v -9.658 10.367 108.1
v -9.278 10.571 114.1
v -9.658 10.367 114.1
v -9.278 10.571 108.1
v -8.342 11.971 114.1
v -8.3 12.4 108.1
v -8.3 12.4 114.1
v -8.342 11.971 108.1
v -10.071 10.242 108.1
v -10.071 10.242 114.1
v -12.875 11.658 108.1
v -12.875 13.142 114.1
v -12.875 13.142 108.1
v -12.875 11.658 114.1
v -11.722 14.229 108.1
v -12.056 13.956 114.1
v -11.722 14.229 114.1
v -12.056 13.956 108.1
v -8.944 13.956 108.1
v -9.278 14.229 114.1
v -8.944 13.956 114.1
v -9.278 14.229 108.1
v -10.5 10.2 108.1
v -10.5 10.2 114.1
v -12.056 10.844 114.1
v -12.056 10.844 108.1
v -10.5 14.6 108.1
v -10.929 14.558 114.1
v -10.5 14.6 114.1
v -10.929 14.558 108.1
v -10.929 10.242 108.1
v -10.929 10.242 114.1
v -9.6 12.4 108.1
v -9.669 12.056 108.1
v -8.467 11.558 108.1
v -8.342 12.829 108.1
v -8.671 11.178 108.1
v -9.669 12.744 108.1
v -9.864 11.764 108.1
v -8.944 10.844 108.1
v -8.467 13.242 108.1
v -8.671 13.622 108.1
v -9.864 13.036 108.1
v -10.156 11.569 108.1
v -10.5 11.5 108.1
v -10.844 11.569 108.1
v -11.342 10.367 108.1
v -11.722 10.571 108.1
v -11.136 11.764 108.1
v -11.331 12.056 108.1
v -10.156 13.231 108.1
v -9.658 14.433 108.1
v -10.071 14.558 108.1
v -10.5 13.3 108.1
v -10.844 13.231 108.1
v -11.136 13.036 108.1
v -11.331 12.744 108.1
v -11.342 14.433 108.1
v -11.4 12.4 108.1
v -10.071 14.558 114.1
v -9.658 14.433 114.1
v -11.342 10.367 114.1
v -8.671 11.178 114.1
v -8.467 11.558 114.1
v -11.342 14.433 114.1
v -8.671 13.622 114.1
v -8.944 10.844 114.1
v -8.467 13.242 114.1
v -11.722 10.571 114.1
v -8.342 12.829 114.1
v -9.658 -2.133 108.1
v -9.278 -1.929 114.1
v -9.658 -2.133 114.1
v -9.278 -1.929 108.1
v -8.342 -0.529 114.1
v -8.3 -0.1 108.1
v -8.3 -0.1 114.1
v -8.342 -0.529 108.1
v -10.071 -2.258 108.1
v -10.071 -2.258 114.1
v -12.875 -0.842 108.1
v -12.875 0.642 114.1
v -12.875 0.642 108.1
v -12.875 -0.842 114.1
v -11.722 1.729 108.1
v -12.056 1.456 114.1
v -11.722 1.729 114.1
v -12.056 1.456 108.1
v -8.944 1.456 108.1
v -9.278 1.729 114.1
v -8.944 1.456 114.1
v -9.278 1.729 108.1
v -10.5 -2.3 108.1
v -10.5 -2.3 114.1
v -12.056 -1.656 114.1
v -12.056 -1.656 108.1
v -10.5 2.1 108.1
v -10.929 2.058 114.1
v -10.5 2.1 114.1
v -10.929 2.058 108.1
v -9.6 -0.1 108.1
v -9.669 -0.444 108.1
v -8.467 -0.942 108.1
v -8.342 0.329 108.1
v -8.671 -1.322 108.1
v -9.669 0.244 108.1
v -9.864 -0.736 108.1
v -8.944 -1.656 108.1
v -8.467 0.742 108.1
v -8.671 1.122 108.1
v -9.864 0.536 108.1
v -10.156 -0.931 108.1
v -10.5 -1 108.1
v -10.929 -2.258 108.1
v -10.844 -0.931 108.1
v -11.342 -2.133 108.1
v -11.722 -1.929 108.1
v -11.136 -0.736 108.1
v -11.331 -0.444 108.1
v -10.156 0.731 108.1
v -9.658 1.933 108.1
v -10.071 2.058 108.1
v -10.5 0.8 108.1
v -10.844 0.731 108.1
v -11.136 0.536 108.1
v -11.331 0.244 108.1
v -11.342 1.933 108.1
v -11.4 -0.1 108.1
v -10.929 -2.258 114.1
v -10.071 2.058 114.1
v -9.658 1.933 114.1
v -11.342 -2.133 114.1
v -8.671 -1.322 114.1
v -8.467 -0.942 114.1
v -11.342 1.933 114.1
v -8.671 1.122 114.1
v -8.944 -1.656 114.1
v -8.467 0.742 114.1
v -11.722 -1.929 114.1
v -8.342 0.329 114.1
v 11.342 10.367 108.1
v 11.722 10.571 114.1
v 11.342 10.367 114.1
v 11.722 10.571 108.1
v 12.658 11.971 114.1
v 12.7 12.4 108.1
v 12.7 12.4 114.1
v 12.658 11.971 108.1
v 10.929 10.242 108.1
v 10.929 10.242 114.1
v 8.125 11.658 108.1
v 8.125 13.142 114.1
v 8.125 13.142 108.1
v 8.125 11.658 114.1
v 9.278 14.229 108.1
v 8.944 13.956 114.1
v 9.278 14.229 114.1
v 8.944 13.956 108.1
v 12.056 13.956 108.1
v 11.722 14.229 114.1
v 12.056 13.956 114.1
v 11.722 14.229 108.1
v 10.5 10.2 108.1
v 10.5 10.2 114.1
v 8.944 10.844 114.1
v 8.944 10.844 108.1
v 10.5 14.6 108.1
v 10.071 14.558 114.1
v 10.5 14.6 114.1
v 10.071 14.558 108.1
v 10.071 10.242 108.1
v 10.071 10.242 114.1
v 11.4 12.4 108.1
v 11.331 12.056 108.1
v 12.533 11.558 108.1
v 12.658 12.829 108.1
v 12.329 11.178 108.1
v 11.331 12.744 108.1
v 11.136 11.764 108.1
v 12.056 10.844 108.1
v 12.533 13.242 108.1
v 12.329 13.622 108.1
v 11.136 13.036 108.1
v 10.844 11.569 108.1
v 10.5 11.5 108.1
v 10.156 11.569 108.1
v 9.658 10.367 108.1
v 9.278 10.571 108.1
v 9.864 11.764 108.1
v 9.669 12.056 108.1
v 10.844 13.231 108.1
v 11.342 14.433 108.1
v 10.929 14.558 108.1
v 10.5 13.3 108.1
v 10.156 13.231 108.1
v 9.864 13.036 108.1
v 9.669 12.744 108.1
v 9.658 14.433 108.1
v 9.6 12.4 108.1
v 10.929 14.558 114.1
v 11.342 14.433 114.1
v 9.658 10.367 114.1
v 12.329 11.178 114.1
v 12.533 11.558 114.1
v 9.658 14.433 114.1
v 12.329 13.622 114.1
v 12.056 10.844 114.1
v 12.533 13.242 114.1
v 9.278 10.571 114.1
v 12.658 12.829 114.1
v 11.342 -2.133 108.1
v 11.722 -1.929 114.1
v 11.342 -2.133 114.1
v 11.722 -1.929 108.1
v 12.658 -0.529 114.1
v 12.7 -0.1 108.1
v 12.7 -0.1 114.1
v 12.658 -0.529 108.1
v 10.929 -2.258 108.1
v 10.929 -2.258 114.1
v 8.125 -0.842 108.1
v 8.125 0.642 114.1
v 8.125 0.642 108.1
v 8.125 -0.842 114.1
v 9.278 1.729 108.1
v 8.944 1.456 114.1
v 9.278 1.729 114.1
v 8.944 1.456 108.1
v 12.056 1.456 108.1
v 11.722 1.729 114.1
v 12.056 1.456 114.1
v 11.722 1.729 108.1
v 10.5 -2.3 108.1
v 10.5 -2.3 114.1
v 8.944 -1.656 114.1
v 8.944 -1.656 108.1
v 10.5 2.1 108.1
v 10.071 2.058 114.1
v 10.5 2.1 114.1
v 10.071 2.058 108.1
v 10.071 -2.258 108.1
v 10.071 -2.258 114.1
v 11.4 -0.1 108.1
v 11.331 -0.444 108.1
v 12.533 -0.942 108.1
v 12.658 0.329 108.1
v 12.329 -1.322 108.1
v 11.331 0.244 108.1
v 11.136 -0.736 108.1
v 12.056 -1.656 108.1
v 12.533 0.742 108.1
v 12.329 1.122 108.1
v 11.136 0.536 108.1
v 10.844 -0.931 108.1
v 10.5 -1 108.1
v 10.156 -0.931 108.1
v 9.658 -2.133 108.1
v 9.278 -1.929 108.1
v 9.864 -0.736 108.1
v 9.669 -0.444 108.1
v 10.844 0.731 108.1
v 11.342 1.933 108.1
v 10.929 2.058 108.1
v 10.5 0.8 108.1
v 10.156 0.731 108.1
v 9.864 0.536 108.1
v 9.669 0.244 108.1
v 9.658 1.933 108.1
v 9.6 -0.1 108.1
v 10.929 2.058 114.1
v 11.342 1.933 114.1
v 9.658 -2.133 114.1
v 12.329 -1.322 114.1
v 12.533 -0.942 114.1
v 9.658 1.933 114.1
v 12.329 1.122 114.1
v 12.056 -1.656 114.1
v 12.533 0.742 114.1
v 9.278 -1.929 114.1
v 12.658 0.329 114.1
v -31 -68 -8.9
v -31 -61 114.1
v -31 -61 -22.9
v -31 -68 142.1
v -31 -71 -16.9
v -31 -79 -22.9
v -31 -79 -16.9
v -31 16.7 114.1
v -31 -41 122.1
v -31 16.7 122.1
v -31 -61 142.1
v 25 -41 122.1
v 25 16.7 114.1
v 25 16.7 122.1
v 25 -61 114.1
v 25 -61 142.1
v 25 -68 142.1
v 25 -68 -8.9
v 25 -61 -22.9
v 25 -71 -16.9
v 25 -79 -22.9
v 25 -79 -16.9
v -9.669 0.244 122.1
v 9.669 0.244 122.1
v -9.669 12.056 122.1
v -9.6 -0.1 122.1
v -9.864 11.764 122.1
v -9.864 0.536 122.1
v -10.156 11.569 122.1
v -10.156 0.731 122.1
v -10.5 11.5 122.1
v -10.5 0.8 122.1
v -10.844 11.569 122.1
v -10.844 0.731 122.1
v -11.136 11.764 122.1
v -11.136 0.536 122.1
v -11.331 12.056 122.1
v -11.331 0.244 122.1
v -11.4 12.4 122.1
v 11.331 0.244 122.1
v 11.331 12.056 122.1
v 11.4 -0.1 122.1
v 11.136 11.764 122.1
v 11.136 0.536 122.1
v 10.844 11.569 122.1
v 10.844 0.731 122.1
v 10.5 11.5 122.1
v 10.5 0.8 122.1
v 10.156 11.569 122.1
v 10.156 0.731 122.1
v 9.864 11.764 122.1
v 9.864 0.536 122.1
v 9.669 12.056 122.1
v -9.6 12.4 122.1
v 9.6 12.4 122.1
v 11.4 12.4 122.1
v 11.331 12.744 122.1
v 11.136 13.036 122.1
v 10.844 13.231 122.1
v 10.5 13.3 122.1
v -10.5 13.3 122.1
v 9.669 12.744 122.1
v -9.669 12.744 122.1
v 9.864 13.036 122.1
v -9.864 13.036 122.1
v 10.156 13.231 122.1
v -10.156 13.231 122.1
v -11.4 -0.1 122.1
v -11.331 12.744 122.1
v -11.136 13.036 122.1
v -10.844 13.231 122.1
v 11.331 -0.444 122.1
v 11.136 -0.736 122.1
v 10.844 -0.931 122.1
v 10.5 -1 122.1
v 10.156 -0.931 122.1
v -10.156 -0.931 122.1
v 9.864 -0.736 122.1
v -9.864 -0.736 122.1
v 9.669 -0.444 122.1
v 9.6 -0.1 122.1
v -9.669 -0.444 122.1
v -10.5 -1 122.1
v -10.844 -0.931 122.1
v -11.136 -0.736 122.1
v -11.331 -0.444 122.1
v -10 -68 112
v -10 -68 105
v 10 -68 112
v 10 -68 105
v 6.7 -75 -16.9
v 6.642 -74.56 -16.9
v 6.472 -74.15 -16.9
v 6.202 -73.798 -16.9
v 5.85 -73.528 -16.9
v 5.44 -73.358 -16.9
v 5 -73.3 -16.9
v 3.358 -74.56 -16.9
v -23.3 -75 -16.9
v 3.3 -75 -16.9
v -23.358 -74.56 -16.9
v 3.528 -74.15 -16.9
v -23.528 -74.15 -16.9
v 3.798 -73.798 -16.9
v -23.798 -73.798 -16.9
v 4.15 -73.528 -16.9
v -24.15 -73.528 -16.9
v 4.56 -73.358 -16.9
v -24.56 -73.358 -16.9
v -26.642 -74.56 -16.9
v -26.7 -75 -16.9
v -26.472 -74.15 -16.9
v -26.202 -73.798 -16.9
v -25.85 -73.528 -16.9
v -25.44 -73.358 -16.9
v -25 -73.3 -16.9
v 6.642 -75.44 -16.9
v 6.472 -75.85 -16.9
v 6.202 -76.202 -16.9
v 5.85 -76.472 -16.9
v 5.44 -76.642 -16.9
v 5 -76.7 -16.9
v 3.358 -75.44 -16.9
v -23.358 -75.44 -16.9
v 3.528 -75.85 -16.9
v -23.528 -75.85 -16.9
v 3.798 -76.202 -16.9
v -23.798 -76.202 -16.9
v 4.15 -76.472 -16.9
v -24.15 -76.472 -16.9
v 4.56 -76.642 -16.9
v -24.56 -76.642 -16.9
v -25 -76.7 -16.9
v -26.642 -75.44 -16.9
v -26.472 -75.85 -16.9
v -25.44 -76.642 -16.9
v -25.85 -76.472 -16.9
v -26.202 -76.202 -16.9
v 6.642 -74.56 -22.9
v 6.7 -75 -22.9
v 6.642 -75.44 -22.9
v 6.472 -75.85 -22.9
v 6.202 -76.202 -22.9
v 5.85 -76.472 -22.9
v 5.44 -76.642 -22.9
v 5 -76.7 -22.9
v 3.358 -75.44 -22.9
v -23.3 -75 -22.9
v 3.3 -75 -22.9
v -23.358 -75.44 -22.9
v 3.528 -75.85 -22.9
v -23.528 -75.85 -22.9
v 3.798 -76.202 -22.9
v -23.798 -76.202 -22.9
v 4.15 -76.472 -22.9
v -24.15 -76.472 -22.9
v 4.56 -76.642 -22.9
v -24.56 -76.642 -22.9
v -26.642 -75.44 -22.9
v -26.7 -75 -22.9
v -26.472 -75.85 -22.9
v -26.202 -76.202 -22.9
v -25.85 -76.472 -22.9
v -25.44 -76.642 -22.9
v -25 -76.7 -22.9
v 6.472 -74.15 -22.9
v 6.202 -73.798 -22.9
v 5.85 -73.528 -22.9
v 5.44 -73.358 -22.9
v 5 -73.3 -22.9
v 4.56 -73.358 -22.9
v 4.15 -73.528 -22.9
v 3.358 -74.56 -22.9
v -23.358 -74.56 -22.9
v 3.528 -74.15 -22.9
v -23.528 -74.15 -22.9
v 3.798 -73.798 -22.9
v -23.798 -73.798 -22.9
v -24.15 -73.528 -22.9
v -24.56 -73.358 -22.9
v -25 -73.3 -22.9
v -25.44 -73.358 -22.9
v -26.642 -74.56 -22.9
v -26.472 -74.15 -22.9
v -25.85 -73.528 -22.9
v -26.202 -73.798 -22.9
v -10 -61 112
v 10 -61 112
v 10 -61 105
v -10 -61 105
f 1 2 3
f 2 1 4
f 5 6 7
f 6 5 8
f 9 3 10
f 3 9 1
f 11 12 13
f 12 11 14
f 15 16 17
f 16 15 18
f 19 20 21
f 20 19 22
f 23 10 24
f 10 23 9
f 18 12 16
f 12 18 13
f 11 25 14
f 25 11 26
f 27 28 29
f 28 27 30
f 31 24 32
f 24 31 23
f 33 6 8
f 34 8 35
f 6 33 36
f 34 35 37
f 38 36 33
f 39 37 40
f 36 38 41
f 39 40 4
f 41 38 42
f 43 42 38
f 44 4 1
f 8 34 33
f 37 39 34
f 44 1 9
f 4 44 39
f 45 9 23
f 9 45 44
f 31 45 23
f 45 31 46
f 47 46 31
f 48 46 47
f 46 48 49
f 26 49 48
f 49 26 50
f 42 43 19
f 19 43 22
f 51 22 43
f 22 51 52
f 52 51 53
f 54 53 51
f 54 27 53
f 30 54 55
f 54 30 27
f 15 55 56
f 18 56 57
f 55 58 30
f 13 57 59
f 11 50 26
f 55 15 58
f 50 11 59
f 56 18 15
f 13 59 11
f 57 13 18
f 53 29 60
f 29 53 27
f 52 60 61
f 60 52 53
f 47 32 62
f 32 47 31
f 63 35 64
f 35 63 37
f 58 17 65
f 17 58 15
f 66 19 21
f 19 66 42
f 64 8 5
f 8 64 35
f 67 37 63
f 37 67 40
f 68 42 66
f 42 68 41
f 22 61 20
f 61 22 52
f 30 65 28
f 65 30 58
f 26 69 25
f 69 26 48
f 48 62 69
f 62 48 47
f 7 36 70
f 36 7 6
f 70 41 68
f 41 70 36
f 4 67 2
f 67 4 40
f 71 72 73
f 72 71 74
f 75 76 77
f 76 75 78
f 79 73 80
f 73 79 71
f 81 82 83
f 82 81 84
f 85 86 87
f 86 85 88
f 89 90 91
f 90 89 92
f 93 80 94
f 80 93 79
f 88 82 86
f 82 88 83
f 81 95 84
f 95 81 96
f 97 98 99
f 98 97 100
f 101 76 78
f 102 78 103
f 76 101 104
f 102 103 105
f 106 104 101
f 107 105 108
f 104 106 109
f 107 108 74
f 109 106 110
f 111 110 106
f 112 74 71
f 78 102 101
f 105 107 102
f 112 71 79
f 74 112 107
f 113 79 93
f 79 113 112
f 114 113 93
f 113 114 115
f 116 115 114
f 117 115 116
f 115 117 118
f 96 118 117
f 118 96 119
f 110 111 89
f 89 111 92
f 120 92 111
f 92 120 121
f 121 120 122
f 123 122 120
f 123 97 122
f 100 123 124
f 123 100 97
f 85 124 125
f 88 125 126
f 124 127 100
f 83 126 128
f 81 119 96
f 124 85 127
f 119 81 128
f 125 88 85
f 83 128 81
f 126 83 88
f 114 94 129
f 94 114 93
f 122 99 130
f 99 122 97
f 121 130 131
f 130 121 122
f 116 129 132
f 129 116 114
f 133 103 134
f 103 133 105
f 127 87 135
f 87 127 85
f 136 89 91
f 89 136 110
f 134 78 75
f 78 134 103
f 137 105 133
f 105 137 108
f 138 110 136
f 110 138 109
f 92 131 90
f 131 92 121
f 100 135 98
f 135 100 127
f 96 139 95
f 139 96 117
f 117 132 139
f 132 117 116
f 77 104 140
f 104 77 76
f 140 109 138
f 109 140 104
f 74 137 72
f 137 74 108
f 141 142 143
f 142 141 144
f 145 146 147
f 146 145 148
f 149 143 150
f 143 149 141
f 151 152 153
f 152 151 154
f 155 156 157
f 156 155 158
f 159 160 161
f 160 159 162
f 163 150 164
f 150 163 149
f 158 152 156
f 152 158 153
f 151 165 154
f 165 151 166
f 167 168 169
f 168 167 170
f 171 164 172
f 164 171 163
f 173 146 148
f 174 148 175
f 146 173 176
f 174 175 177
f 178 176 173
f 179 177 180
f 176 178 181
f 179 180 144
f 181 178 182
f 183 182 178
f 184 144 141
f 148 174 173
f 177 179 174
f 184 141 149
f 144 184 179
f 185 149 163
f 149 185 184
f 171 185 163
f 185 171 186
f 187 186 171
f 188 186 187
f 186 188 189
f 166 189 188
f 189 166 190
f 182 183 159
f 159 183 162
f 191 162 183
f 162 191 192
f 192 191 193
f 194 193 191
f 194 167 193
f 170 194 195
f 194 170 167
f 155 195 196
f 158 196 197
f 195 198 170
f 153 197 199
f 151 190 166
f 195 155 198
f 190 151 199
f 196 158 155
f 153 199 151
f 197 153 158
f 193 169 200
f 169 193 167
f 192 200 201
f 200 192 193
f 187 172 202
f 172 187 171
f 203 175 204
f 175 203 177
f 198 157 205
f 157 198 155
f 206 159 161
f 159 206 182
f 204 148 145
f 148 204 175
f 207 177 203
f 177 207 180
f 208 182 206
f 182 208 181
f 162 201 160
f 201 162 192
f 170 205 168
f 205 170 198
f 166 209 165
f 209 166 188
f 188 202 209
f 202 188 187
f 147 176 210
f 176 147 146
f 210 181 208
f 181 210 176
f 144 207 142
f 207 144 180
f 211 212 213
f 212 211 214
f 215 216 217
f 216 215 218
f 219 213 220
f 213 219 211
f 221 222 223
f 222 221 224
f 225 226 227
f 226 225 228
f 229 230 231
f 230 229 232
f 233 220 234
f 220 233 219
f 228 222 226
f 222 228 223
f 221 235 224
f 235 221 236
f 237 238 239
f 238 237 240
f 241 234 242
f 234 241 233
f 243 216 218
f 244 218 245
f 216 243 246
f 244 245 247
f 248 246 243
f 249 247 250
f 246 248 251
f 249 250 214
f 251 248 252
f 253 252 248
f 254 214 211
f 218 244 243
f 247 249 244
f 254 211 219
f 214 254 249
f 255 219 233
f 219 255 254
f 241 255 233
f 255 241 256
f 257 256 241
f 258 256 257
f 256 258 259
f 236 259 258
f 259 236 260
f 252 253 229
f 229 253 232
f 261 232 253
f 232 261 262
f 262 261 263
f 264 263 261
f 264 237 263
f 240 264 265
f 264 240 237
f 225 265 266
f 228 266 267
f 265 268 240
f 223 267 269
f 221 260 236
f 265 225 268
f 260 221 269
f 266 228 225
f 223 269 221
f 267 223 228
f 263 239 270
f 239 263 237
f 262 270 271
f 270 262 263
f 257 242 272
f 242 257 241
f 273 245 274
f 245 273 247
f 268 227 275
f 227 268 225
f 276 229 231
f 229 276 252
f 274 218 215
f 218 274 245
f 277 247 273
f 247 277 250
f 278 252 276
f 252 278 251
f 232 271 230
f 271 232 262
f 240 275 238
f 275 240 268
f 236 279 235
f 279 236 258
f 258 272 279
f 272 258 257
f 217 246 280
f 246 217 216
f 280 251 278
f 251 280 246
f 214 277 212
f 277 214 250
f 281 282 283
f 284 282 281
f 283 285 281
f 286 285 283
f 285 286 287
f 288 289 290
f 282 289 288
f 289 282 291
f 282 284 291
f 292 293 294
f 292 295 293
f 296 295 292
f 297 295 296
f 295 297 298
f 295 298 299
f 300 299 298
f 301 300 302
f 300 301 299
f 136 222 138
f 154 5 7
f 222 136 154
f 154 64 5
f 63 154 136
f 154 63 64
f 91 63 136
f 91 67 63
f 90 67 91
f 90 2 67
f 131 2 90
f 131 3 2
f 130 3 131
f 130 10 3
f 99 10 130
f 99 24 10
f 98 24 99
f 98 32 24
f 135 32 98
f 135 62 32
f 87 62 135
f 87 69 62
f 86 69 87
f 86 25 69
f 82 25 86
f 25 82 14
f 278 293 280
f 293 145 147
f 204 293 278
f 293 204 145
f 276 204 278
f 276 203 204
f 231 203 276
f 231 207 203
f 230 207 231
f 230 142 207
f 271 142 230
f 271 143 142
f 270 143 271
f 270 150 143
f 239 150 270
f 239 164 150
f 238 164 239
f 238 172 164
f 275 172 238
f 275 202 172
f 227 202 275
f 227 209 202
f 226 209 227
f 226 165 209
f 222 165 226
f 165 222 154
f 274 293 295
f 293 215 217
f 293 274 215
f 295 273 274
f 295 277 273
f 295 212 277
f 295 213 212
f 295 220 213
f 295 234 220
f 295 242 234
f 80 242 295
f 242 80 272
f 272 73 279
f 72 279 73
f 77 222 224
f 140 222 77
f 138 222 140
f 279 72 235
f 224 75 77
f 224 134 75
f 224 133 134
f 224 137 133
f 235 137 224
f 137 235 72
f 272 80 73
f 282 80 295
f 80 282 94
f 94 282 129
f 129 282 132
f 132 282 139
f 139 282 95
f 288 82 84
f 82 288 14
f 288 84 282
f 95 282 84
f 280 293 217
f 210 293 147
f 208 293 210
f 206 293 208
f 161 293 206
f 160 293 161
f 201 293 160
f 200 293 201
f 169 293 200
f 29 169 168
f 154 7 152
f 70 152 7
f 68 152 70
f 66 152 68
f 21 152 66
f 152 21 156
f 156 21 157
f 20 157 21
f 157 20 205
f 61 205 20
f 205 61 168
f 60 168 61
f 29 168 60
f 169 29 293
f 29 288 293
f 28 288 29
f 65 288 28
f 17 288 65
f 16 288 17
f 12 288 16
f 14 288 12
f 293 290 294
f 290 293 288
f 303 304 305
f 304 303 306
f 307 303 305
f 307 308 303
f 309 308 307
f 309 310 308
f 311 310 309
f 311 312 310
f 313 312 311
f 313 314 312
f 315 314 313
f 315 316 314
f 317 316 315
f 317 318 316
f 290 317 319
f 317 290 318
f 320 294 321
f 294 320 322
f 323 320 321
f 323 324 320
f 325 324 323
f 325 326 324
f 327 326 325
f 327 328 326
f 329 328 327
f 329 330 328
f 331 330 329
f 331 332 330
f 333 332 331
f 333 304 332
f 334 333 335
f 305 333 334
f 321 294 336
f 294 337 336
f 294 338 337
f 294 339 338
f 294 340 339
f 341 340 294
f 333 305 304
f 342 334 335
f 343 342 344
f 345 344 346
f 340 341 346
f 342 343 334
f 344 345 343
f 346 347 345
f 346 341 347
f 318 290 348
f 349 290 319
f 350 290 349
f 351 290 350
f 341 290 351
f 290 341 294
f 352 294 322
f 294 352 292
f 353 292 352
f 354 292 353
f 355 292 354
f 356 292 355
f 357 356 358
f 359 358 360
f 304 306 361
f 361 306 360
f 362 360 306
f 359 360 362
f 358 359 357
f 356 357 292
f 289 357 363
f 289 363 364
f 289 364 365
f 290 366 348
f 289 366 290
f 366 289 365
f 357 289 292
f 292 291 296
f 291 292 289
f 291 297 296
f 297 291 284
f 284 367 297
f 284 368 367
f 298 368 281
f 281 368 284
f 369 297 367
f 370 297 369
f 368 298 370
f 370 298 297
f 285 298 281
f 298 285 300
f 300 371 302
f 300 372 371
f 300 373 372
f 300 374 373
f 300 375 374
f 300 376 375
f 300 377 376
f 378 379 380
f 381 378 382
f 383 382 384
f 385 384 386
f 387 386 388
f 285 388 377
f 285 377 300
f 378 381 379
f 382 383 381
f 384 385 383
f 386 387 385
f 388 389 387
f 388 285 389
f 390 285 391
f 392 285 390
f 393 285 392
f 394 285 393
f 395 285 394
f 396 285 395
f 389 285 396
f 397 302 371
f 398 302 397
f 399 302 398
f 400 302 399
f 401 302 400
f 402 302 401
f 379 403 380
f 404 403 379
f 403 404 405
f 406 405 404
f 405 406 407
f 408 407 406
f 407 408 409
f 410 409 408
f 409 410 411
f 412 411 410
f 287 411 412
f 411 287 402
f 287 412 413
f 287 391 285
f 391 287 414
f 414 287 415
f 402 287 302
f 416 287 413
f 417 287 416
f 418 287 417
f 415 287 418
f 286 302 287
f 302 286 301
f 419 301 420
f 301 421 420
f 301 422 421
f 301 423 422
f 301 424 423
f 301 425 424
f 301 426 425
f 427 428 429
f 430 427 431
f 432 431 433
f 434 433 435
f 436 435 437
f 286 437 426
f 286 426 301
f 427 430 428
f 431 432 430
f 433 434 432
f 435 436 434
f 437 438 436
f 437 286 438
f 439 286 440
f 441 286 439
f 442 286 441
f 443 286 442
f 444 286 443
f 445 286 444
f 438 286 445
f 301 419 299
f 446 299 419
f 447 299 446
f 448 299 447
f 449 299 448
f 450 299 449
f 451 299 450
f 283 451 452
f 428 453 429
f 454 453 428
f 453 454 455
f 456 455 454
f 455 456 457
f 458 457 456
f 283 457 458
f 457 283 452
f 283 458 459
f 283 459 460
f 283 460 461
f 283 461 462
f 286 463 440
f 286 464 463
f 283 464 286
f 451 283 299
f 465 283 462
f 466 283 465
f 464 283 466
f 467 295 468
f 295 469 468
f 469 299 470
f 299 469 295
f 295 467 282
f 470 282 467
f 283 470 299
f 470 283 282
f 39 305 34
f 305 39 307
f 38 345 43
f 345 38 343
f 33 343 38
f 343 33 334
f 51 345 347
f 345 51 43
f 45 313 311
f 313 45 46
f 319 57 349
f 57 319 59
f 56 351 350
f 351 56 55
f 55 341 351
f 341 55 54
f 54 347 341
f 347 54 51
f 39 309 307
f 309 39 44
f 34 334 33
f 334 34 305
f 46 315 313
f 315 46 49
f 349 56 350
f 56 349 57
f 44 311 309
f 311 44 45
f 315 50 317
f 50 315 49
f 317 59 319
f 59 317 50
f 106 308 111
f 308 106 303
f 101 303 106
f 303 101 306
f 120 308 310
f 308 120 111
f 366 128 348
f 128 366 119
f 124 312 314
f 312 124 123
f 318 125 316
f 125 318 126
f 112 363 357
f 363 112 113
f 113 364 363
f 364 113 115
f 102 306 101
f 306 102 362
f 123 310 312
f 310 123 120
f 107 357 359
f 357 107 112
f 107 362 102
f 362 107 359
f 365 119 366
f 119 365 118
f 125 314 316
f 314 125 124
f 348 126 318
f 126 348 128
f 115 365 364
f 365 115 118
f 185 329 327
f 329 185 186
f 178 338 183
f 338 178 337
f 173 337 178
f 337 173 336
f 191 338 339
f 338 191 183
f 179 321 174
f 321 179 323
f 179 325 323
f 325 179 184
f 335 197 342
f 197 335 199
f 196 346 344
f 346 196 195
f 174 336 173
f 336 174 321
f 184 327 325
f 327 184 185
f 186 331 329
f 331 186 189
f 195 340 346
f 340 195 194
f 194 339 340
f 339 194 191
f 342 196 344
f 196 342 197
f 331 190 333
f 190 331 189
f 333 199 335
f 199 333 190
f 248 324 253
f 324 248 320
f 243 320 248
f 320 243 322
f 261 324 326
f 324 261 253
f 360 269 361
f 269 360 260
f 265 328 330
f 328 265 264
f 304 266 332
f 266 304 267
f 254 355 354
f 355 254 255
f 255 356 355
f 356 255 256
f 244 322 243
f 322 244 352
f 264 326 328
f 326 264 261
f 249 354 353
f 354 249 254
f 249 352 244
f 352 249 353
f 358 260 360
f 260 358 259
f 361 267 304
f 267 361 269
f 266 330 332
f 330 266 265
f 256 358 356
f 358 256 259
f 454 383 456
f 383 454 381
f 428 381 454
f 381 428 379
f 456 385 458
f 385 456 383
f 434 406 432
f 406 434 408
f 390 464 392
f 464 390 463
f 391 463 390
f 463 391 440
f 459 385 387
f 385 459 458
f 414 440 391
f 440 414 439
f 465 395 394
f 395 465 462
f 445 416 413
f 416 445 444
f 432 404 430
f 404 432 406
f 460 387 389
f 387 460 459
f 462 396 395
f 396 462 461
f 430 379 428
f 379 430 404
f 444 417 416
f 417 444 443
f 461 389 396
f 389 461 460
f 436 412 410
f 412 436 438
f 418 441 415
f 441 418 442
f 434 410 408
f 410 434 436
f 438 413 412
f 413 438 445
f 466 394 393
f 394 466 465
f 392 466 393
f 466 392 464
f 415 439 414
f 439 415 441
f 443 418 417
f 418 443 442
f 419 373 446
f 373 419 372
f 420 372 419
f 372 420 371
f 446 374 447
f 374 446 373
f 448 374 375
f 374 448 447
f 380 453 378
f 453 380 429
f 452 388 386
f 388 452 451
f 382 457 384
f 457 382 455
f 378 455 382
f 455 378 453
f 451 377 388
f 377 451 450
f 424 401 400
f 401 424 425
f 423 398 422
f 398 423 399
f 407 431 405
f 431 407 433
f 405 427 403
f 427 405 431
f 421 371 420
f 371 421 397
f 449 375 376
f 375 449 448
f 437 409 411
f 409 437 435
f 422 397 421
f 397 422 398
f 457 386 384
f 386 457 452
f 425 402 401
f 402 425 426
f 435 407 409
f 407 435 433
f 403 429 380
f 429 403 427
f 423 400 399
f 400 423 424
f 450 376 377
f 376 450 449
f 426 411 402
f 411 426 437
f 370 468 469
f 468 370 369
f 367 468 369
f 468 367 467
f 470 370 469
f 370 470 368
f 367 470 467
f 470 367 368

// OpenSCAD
// file: machine_frame.scad
// =============================================
// Riftbound Card Sorter — shared machine frame
// =============================================
// Single source of truth for the card path after the Nov 11 redesign
// (suction pick from a motor-raised hopper, raised transport line,
// cradle shuttle sorter). Machine coords as in assembly.scad:
//   X = card travel (hopper -> belt -> tray), Y = across belt (+Y = back,
//   electronics side), Z = up, Z=0 bottom of baseplate tiles.
// `use <machine_frame.scad>` does not import variables, so read these via
// the functions at the bottom.
// =============================================

base_top   = 4;      // top of baseplate tiles
riser_h    = 60;     // conveyor deck raised so cards can FALL into both tray floors
deck_z     = base_top + riser_h;          // rail base / hopper deck reference = 64

// Conveyor (geometry unchanged, just lifted by riser_h)
belt_x0    = -165;   // belt start
belt_x1    = 85;     // belt end
roller_x   = [-140, 60];
rail_in    = 45;     // |Y| of rail inner faces
shaft_z    = deck_z + 15;
card_z     = deck_z + 15 + 11.9;          // top of round belts = card face = 90.9
scan_flat  = [-127, 47];                  // slide-bed backed flat zone (X)

// Scanner
cam_x      = 5;      // lens axis; card centred here for capture (moved from -40 so the hood clears the arm drop zone at X -139..-51)

// Hopper (motor-raised floor keeps top card at card_z)
hopper_x   = -215;   // cavity centre X (Y = 0)

// Baseplate extents (3x3 tiles of 190x180)
base_x     = [-285, 285];
base_y     = [-270, 270];

// Pick & place hand-off
drop_x     = -95;    // card CENTRE when the suction arm releases it onto the belt
                     // (card spans -139..-51: on belts, clear of hopper wall)
drop_clear = 3;      // card underside this far above belt at release (low drop)

// Sorting tray (bottom on baseplate); owner of tray placement may move it in X
tray_floor_lower_z = base_top + 2.5;      // lower slot floor
tray_floor_upper_z = base_top + 65 + 3 + 2.5;  // = 74.5 upper slot floor

// Card
card_w = 63; card_l = 88; card_t = 0.33;  // RAW cards (owner confirmed 2026-11-11: no sleeves), ~1.75 g

// MG996R mounting-tab holes (all three servos: pick arm ch0, shuttle ch1 / ch2).
// ONE value for every mount: hole-centre pitch along the case (49.5, TowerPro
// MG996R drawing) × across it (10), symmetric about the case centre. Clones
// vary (48.5..50 seen); the servo's own tab holes are Ø4.5+ grommet holes, so
// an M3 / M2.5 still lands for ±0.7 mm. MEASURE YOUR SERVO; if it is further
// off, change it here and re-export the arm head and the shuttle end post / riser.
mg996r_hole_pitch = 49.5;
mg996r_hole_dx    = 10;

function frame_base_top()  = base_top;
function frame_riser_h()   = riser_h;
function frame_deck_z()    = deck_z;
function frame_belt_x0()   = belt_x0;
function frame_belt_x1()   = belt_x1;
function frame_roller_x()  = roller_x;
function frame_rail_in()   = rail_in;
function frame_card_z()    = card_z;
function frame_scan_flat() = scan_flat;
function frame_cam_x()     = cam_x;
function frame_hopper_x()  = hopper_x;
function frame_base_x()    = base_x;
function frame_base_y()    = base_y;
function frame_drop_x()    = drop_x;
function frame_drop_clear()= drop_clear;
function frame_tray_floor_lower_z() = tray_floor_lower_z;
function frame_tray_floor_upper_z() = tray_floor_upper_z;
function frame_mg996r_hole_pitch() = mg996r_hole_pitch;
function frame_mg996r_hole_dx()    = mg996r_hole_dx;
// main file
// =============================================
// Riftbound Card Sorter — Camera Bracket
// =============================================
// Hangs a Pi Camera Module 3 (standard, 66°×41° FOV) LENS-DOWN under a
// cantilever arm, 100 mm above the card face, its lens poking into the
// scanner hood's roof port. The bracket stands on the two FRONT (-Y) rail
// L-feet nearest the camera axis and shares their M3 screws.
//
// Shape (side profile in Y/Z, extruded along X):
//
//                gusset /|
//          arm =======/ |             ← PCB hangs under the arm tip on
//              [PCB]   |=|  ← CSI      4 standoffs, lens down
//               \lens/ | |    ribbon
//          ┌─hood roof─┐| |    slot     vertical plate, outside the front
//          │           │| |              (-Y) rail and its foot gussets
//   ===rail top===     │|_|\__
//                      ─────┘  ← foot on the 2 front rail L-feet (M3 shared)
//
// Material: PLA or PETG, 0.2 mm layers, 4 walls, 30–40 % infill
// =============================================
//
// COORDINATE FRAME (machine axes, as assembly.scad / machine_frame.scad):
//   X = card travel, Y = across belt (+Y = back / electronics side), Z = up.
//   ORIGIN = camera optical axis on the card face, i.e. machine
//   (frame_cam_x(), 0, frame_card_z()) = (5, 0, 90.9).
//   camera_bracket_placed() applies that translation.
//
// ---------------------------------------------
// CARD FACE / MOUNT HEIGHTS (machine Z, from machine_frame.scad)
//   baseplate top 4 → riser 60 → rail base (deck_z)          = 64
//   rail L-foot plate 4 mm thick → foot top                    = 68  ← bracket foot underside
//   roller axis deck_z + 15 = 79, belt top + 11.9 → card face  = 90.9
//   → foot underside local z = 68 − 90.9 = −22.9
//
// LENS HEIGHT (local z above the card face)
//   lens tip              z = lens_h                 = 100.00  (Pi Cam 3 min focus ~10 cm)
//   PCB front (lens side) z = lens_h + lens_proj     = 106.98  (RPi drawing: lens tip
//                                                       6.98 mm proud of the PCB)
//   PCB back              z = + pcb_t (1.12)         = 108.10
//   arm underside         z = + so_h (6)             = 114.10  (FPC connector 3.2 mm tall
//                                                       on the PCB back → 2.8 mm clear)
//   arm top               z = + arm_h (8)            = 122.10  (machine 213.0)
//   plate: foot underside → gusset top = 22.9 + 122.1 + 20 = 165 mm
//
// FIELD OF VIEW at 100 mm (Pi Cam 3 standard: 66° H × 41° V, apex at the lens tip)
//   along X: 2·100·tan(33°)   = 129.9 mm  vs card 88 → ±20.9 mm margin
//   along Y: 2·100·tan(20.5°) =  74.8 mm  vs card 63 → ±5.9 mm centred,
//            4.2 mm worst case with the card against a guide (±1.7 mm play).
//   (lens_h = 102 would give ≥ 5.0 mm worst case; kept at 100 per spec.)
//
// CARD ORIENTATION → PCB ORIENTATION
//   Cards travel along X with the 88 mm length along X, so the image's long
//   (66°) axis must lie along X. Per the RPi drawing the 66° axis is parallel
//   to the 25 mm PCB edge (FPC-connector edge, 21 mm hole spacing); the 41°
//   axis runs along the 23.862 mm PCB height (12.5 mm hole spacing).
//   ⇒ 21 mm hole spacing along X, 12.5 mm along Y, FPC edge facing −Y
//     (toward the plate and its ribbon slot). NOTE: this is the old bracket
//     turned 180° about Z, so set the camera transform to rotate 180°
//     (Picamera2: Transform(hflip=1, vflip=1)) if image orientation matters.
//
// PI CAMERA MODULE 3 (standard) — RPi mechanical drawing RP-008153-DS-1:
//   PCB 25 × 23.862 × 1.12 mm, 4× ø2.2 holes (ø4.75 pad keep-out).
//   Holes 2.0 mm from left/right edges → 21.0 mm apart.
//   Hole row A 2.0 mm from the edge AWAY from the FPC connector,
//   row B 14.5 mm from that edge → 12.5 mm apart (9.362 mm from FPC edge).
//   Lens centred left/right, 14.4 mm from the non-FPC edge.
//   FPC connector on the PCB back along the FPC edge: 19.61 × 5.71, ~3.2 tall.
//
//   PCB (u along the 25 mm edge, v from the non-FPC edge) → local:
//     X = u − 12.5,  Y = −(v − 14.4)   (lens at X = Y = 0, FPC edge at −Y)
//     holes  (−10.5, +12.4) (+10.5, +12.4)   row A, non-FPC side (+Y)
//            (−10.5,  −0.1) (+10.5,  −0.1)   row B, FPC side
//     PCB outline X −12.5..+12.5, Y −9.462..+14.4
// ---------------------------------------------

use <machine_frame.scad>
use <conveyor_rail.scad>

/* [Export] */
print_orient = false;  // true → lay on the −X face for slicing

// --- Frame ---
cam_x       = frame_cam_x();           // 5
card_z      = frame_card_z();          // 90.9
deck_z      = frame_deck_z();          // 64
rail_in     = frame_rail_in();         // 45
belt_x0     = frame_belt_x0();         // −165
rail_foot_t = 4;                       // conveyor_rail.scad foot_t
rail_wall   = rail_wall();             // 3
rail_gus    = 12;                      // conveyor_rail.scad foot_gusset (legs, mm)

// --- Optics / placement ---
lens_h      = 100;     // lens tip above card face
lens_proj   = 6.98;    // lens tip in front of PCB front face (RPi drawing)
pcb_t       = 1.12;    // PCB thickness

// --- Pi Cam 3 hole pattern (local XY, lens at origin) ---
cam_u       = [2.0, 23.0];               // hole u (along 25 mm edge)
cam_v       = [2.0, 14.5];               // hole v (from non-FPC edge)
lens_u      = 12.5;
lens_v      = 14.4;
pcb_w       = 25;
pcb_hgt     = 23.862;
m2_pilot    = 1.8;     // M2 self-tapping pilot (or tap M2)
so_od       = 4.4;     // standoff OD (fits inside ø4.75 pad keep-out)
so_h        = 6;       // standoff height: clears 3.2 mm FPC connector on PCB back

// --- Mount: the two front-rail L-feet either side of the camera axis ---
// Front rail feet (machine X): half 1 at belt_x0 + rail_feet_x(false, true),
// half 2 at belt_x0 + 125 + rail_feet_x(true, true) → −80, −50, −20, 10.
feet_all    = concat([for (f = rail_feet_x(false, true)) belt_x0 + f],
                     [for (f = rail_feet_x(true,  true)) belt_x0 + 125 + f]);
foot_lo     = max([for (f = feet_all) if (f <= cam_x) f]);   // −20 (for cam_x = 5)
foot_hi     = min([for (f = feet_all) if (f >  cam_x) f]);   // 10
hole_y      = -(rail_in + rail_foot_hole_y());               // −75
mount_d     = 3.4;     // M3 clearance (same as the rail feet)
mount_pts   = [[foot_lo - cam_x, hole_y], [foot_hi - cam_x, hole_y]];

// --- Structure (local Y/Z) ---
arm_h       = 8;       // arm thickness
arm_tip_pad = 2.1;     // arm runs past the outer standoff edge by this much
plate_t     = 7;       // vertical plate thickness (Y)
plate_y     = -(rail_in + rail_wall + rail_gus + 1);   // −61: inner face, 1 mm past
                                                        // the rail-foot gusset webs
foot_t      = 6;       // foot thickness (Z)
foot_y1     = hole_y - 4;                               // −79 (rail foot ends at |Y| 79)
gus_arm     = 20;      // gusset above arm/plate joint (legs, mm)
gus_foot_y  = 3;       // foot gusset legs (Y × Z) — stops 1.25 mm short of the
gus_foot_z  = 8;       //   M3 head (ø5.5 at Y −75)
bw_half     = 25;      // half-width of the bracket about the lens axis (X)
bx0         = min(-bw_half, mount_pts[0][0] - 6);
bx1         = max( bw_half, mount_pts[1][0] + 6);

// --- CSI ribbon exit slot (through plate, in line with the FPC edge) ---
csl_w       = 20;      // X  (15-pin FPC is 16 mm wide)
csl_z0      = 105;     // slot bottom  (connector spans z 108.1..111.3)
csl_z1      = 112;     // slot top     (2.1 mm below arm underside)

// --- Derived ---
pcb_front_z = lens_h + lens_proj;        // 106.98
pcb_back_z  = pcb_front_z + pcb_t;       // 108.10
arm_bot     = pcb_back_z + so_h;         // 114.10
arm_top     = arm_bot + arm_h;           // 122.10
foot_z0     = deck_z + rail_foot_t - card_z;   // −22.9
holes       = [for (u = cam_u) for (v = cam_v) [u - lens_u, -(v - lens_v)]];
arm_y1      = -(cam_v[0] - lens_v) + so_od / 2 + arm_tip_pad;   // +16.7

// ── Shared values for the hood / checks ──
function cam_lens_h()        = lens_h;
function cam_pcb_front_rel() = pcb_front_z;   // PCB front face above the card face
function cam_holes()         = holes;
function cam_mount_xy()      = [for (p = mount_pts) [p[0] + cam_x, p[1]]];  // machine

echo(str("CAMERA BRACKET: lens tip machine Z ", card_z + lens_h, ", PCB front ", card_z + pcb_front_z,
         ", arm top ", card_z + arm_top, "; foot on front rail feet X ", foot_lo, " & ", foot_hi,
         " (M3 at Y ", hole_y, ", Z ", deck_z + rail_foot_t, "); bracket X ", cam_x + bx0, "..", cam_x + bx1));
assert(arm_bot - pcb_back_z >= 3.2 + 2, "standoffs too short for the FPC connector");
assert(plate_y - plate_t - gus_foot_y > hole_y + 5.5 / 2, "foot gusset hits the M3 head");
// The foot must land on two real front-rail L-feet: one each side of the lens,
// both fully under the bracket (rail foot pads are 10 mm wide along X).
assert(!is_undef(foot_lo) && !is_undef(foot_hi), "no front rail foot on one side of cam_x");
assert(bx0 <= foot_lo - cam_x - 5 && bx1 >= foot_hi - cam_x + 5, "bracket foot does not cover both rail feet");
assert(foot_hi - foot_lo <= 60, "rail feet too far apart for a stiff foot");

// Side profile in (Y, Z); extruded along X.
module side_profile() {
    polygon([
        [plate_y,                         foot_z0],
        [foot_y1,                         foot_z0],
        [foot_y1,                         foot_z0 + foot_t],
        [plate_y - plate_t - gus_foot_y,  foot_z0 + foot_t],
        [plate_y - plate_t,               foot_z0 + foot_t + gus_foot_z],
        [plate_y - plate_t,               arm_top + gus_arm],
        [plate_y,                         arm_top + gus_arm],
        [plate_y + gus_arm,               arm_top],
        [arm_y1,                          arm_top],
        [arm_y1,                          arm_bot],
        [plate_y,                         arm_bot],
    ]);
}

// Standoff section: teardrop pointing −X (down when printed on the −X face),
// truncated at the ø4.75 pad radius so it never touches PCB parts.
module standoff_2d() {
    intersection() {
        hull() {
            circle(d = so_od, $fn = 32);
            translate([-so_od / 2 * sqrt(2), 0]) square(0.01, center = true);
        }
        translate([-4.75 / 2, -so_od]) square([so_od * 2, so_od * 2]);
    }
}

module camera_bracket() {
    difference() {
        union() {
            // Body: foot + plate + arm + gussets
            translate([bx0, 0, 0])
                rotate([90, 0, 90])
                    linear_extrude(bx1 - bx0) side_profile();

            // 4× standoffs hanging from arm underside
            for (h = holes)
                translate([h[0], h[1], pcb_back_z])
                    linear_extrude(so_h + 0.01) standoff_2d();
        }

        // M2 pilot holes through standoffs and arm
        for (h = holes)
            translate([h[0], h[1], pcb_back_z - 0.1])
                cylinder(d = m2_pilot, h = so_h + arm_h + 0.2, $fn = 16);

        // 2× M3 through the foot, coaxial with the rail-foot holes
        for (p = mount_pts)
            translate([p[0], p[1], foot_z0 - 0.1])
                cylinder(d = mount_d, h = foot_t + 0.2, $fn = 24);

        // CSI ribbon slot through plate, centred on the lens X
        translate([-csl_w / 2, plate_y - plate_t - 0.1, csl_z0])
            cube([csl_w, plate_t + 0.2, csl_z1 - csl_z0]);
    }
}

// Ghost of the camera PCB + lens for checking (local frame)
module camera_ghost() {
    translate([-lens_u, -(pcb_hgt - lens_v), pcb_front_z]) cube([pcb_w, pcb_hgt, pcb_t]);
    translate([0, 0, lens_h]) cylinder(d = 5.75, h = lens_proj, $fn = 32);
}

// Machine-coordinate placement (used by scanner_hood.scad asm_scan_station())
module camera_bracket_placed() translate([cam_x, 0, card_z]) camera_bracket();
module camera_ghost_placed()   translate([cam_x, 0, card_z]) camera_ghost();

if (print_orient)
    rotate([0, -90, 0]) translate([-bx0, 0, 0]) camera_bracket();  // −X face → bed (local +X → +Z)
else {
    camera_bracket();
    %camera_ghost();
}

// =============================================
// HARDWARE: 4× M2×10 self-tapping (or machine screw into a tapped hole),
//   heads on the lens side of the PCB (they stay ≥ 0.9 mm above the hood
//   roof); 2× M3 shared with the two front rail L-feet either side of cam_x,
//   i.e. machine (−20, −75) and (10, −75) for cam_x = 5: use screws 6 mm longer than the rail-foot screws.
// RIBBON: Pi Zero 2 W (22-pin 0.5 mm "mini") ↔ Cam 3 (15-pin 1 mm "standard"):
//   Raspberry Pi Camera Cable Standard–Mini 500 mm, part SC1130.
//   Route: through the plate slot, turn +X round the plate's downstream edge
//   (X ≈ cam_x + 25), drape over the hood's downstream shoulder, down behind
//   the back rail and over the electronics-tray wall to the Pi. Length,
//   measured on assembly.scad's asm_ribbon path: 405 mm from the camera
//   connector to the drop into the tray at X 5, Y 88, Z 30, + ≈ 46 mm inside
//   the tray to the Pi's CSI connector (X ≈ 22, Y ≈ 100, Z ≈ 13) = ≈ 450 mm
//   with the Pi's camera connector facing +X (≈ 480 mm facing −X). The cable
//   is 500 mm, so only ≈ 50 mm of slack: mount the Pi with its CSI end
//   toward +X and do not add detours.
// ASSEMBLY: fit the hood first. Connect the ribbon to the camera, feed it
//   through the plate slot, screw the PCB on lens-down, then lower the
//   bracket straight down (lens into the hood roof port) onto the rail feet.
// PRINT ORIENTATION: on its SIDE — the −X face (the flat face showing the
//   full L/Z profile) on the bed (print_orient = true exports it rotated).
//   Footprint ≈ 96 × 165 mm, 51 mm tall. Straight extrusion along print-Z
//   except the teardrop standoffs (≤ 45°, tip truncated), the self-bridging
//   ø1.8/ø3.4 horizontal holes and the 7 mm CSI slot bridge.
// SUPPORTS: none.
// =============================================
